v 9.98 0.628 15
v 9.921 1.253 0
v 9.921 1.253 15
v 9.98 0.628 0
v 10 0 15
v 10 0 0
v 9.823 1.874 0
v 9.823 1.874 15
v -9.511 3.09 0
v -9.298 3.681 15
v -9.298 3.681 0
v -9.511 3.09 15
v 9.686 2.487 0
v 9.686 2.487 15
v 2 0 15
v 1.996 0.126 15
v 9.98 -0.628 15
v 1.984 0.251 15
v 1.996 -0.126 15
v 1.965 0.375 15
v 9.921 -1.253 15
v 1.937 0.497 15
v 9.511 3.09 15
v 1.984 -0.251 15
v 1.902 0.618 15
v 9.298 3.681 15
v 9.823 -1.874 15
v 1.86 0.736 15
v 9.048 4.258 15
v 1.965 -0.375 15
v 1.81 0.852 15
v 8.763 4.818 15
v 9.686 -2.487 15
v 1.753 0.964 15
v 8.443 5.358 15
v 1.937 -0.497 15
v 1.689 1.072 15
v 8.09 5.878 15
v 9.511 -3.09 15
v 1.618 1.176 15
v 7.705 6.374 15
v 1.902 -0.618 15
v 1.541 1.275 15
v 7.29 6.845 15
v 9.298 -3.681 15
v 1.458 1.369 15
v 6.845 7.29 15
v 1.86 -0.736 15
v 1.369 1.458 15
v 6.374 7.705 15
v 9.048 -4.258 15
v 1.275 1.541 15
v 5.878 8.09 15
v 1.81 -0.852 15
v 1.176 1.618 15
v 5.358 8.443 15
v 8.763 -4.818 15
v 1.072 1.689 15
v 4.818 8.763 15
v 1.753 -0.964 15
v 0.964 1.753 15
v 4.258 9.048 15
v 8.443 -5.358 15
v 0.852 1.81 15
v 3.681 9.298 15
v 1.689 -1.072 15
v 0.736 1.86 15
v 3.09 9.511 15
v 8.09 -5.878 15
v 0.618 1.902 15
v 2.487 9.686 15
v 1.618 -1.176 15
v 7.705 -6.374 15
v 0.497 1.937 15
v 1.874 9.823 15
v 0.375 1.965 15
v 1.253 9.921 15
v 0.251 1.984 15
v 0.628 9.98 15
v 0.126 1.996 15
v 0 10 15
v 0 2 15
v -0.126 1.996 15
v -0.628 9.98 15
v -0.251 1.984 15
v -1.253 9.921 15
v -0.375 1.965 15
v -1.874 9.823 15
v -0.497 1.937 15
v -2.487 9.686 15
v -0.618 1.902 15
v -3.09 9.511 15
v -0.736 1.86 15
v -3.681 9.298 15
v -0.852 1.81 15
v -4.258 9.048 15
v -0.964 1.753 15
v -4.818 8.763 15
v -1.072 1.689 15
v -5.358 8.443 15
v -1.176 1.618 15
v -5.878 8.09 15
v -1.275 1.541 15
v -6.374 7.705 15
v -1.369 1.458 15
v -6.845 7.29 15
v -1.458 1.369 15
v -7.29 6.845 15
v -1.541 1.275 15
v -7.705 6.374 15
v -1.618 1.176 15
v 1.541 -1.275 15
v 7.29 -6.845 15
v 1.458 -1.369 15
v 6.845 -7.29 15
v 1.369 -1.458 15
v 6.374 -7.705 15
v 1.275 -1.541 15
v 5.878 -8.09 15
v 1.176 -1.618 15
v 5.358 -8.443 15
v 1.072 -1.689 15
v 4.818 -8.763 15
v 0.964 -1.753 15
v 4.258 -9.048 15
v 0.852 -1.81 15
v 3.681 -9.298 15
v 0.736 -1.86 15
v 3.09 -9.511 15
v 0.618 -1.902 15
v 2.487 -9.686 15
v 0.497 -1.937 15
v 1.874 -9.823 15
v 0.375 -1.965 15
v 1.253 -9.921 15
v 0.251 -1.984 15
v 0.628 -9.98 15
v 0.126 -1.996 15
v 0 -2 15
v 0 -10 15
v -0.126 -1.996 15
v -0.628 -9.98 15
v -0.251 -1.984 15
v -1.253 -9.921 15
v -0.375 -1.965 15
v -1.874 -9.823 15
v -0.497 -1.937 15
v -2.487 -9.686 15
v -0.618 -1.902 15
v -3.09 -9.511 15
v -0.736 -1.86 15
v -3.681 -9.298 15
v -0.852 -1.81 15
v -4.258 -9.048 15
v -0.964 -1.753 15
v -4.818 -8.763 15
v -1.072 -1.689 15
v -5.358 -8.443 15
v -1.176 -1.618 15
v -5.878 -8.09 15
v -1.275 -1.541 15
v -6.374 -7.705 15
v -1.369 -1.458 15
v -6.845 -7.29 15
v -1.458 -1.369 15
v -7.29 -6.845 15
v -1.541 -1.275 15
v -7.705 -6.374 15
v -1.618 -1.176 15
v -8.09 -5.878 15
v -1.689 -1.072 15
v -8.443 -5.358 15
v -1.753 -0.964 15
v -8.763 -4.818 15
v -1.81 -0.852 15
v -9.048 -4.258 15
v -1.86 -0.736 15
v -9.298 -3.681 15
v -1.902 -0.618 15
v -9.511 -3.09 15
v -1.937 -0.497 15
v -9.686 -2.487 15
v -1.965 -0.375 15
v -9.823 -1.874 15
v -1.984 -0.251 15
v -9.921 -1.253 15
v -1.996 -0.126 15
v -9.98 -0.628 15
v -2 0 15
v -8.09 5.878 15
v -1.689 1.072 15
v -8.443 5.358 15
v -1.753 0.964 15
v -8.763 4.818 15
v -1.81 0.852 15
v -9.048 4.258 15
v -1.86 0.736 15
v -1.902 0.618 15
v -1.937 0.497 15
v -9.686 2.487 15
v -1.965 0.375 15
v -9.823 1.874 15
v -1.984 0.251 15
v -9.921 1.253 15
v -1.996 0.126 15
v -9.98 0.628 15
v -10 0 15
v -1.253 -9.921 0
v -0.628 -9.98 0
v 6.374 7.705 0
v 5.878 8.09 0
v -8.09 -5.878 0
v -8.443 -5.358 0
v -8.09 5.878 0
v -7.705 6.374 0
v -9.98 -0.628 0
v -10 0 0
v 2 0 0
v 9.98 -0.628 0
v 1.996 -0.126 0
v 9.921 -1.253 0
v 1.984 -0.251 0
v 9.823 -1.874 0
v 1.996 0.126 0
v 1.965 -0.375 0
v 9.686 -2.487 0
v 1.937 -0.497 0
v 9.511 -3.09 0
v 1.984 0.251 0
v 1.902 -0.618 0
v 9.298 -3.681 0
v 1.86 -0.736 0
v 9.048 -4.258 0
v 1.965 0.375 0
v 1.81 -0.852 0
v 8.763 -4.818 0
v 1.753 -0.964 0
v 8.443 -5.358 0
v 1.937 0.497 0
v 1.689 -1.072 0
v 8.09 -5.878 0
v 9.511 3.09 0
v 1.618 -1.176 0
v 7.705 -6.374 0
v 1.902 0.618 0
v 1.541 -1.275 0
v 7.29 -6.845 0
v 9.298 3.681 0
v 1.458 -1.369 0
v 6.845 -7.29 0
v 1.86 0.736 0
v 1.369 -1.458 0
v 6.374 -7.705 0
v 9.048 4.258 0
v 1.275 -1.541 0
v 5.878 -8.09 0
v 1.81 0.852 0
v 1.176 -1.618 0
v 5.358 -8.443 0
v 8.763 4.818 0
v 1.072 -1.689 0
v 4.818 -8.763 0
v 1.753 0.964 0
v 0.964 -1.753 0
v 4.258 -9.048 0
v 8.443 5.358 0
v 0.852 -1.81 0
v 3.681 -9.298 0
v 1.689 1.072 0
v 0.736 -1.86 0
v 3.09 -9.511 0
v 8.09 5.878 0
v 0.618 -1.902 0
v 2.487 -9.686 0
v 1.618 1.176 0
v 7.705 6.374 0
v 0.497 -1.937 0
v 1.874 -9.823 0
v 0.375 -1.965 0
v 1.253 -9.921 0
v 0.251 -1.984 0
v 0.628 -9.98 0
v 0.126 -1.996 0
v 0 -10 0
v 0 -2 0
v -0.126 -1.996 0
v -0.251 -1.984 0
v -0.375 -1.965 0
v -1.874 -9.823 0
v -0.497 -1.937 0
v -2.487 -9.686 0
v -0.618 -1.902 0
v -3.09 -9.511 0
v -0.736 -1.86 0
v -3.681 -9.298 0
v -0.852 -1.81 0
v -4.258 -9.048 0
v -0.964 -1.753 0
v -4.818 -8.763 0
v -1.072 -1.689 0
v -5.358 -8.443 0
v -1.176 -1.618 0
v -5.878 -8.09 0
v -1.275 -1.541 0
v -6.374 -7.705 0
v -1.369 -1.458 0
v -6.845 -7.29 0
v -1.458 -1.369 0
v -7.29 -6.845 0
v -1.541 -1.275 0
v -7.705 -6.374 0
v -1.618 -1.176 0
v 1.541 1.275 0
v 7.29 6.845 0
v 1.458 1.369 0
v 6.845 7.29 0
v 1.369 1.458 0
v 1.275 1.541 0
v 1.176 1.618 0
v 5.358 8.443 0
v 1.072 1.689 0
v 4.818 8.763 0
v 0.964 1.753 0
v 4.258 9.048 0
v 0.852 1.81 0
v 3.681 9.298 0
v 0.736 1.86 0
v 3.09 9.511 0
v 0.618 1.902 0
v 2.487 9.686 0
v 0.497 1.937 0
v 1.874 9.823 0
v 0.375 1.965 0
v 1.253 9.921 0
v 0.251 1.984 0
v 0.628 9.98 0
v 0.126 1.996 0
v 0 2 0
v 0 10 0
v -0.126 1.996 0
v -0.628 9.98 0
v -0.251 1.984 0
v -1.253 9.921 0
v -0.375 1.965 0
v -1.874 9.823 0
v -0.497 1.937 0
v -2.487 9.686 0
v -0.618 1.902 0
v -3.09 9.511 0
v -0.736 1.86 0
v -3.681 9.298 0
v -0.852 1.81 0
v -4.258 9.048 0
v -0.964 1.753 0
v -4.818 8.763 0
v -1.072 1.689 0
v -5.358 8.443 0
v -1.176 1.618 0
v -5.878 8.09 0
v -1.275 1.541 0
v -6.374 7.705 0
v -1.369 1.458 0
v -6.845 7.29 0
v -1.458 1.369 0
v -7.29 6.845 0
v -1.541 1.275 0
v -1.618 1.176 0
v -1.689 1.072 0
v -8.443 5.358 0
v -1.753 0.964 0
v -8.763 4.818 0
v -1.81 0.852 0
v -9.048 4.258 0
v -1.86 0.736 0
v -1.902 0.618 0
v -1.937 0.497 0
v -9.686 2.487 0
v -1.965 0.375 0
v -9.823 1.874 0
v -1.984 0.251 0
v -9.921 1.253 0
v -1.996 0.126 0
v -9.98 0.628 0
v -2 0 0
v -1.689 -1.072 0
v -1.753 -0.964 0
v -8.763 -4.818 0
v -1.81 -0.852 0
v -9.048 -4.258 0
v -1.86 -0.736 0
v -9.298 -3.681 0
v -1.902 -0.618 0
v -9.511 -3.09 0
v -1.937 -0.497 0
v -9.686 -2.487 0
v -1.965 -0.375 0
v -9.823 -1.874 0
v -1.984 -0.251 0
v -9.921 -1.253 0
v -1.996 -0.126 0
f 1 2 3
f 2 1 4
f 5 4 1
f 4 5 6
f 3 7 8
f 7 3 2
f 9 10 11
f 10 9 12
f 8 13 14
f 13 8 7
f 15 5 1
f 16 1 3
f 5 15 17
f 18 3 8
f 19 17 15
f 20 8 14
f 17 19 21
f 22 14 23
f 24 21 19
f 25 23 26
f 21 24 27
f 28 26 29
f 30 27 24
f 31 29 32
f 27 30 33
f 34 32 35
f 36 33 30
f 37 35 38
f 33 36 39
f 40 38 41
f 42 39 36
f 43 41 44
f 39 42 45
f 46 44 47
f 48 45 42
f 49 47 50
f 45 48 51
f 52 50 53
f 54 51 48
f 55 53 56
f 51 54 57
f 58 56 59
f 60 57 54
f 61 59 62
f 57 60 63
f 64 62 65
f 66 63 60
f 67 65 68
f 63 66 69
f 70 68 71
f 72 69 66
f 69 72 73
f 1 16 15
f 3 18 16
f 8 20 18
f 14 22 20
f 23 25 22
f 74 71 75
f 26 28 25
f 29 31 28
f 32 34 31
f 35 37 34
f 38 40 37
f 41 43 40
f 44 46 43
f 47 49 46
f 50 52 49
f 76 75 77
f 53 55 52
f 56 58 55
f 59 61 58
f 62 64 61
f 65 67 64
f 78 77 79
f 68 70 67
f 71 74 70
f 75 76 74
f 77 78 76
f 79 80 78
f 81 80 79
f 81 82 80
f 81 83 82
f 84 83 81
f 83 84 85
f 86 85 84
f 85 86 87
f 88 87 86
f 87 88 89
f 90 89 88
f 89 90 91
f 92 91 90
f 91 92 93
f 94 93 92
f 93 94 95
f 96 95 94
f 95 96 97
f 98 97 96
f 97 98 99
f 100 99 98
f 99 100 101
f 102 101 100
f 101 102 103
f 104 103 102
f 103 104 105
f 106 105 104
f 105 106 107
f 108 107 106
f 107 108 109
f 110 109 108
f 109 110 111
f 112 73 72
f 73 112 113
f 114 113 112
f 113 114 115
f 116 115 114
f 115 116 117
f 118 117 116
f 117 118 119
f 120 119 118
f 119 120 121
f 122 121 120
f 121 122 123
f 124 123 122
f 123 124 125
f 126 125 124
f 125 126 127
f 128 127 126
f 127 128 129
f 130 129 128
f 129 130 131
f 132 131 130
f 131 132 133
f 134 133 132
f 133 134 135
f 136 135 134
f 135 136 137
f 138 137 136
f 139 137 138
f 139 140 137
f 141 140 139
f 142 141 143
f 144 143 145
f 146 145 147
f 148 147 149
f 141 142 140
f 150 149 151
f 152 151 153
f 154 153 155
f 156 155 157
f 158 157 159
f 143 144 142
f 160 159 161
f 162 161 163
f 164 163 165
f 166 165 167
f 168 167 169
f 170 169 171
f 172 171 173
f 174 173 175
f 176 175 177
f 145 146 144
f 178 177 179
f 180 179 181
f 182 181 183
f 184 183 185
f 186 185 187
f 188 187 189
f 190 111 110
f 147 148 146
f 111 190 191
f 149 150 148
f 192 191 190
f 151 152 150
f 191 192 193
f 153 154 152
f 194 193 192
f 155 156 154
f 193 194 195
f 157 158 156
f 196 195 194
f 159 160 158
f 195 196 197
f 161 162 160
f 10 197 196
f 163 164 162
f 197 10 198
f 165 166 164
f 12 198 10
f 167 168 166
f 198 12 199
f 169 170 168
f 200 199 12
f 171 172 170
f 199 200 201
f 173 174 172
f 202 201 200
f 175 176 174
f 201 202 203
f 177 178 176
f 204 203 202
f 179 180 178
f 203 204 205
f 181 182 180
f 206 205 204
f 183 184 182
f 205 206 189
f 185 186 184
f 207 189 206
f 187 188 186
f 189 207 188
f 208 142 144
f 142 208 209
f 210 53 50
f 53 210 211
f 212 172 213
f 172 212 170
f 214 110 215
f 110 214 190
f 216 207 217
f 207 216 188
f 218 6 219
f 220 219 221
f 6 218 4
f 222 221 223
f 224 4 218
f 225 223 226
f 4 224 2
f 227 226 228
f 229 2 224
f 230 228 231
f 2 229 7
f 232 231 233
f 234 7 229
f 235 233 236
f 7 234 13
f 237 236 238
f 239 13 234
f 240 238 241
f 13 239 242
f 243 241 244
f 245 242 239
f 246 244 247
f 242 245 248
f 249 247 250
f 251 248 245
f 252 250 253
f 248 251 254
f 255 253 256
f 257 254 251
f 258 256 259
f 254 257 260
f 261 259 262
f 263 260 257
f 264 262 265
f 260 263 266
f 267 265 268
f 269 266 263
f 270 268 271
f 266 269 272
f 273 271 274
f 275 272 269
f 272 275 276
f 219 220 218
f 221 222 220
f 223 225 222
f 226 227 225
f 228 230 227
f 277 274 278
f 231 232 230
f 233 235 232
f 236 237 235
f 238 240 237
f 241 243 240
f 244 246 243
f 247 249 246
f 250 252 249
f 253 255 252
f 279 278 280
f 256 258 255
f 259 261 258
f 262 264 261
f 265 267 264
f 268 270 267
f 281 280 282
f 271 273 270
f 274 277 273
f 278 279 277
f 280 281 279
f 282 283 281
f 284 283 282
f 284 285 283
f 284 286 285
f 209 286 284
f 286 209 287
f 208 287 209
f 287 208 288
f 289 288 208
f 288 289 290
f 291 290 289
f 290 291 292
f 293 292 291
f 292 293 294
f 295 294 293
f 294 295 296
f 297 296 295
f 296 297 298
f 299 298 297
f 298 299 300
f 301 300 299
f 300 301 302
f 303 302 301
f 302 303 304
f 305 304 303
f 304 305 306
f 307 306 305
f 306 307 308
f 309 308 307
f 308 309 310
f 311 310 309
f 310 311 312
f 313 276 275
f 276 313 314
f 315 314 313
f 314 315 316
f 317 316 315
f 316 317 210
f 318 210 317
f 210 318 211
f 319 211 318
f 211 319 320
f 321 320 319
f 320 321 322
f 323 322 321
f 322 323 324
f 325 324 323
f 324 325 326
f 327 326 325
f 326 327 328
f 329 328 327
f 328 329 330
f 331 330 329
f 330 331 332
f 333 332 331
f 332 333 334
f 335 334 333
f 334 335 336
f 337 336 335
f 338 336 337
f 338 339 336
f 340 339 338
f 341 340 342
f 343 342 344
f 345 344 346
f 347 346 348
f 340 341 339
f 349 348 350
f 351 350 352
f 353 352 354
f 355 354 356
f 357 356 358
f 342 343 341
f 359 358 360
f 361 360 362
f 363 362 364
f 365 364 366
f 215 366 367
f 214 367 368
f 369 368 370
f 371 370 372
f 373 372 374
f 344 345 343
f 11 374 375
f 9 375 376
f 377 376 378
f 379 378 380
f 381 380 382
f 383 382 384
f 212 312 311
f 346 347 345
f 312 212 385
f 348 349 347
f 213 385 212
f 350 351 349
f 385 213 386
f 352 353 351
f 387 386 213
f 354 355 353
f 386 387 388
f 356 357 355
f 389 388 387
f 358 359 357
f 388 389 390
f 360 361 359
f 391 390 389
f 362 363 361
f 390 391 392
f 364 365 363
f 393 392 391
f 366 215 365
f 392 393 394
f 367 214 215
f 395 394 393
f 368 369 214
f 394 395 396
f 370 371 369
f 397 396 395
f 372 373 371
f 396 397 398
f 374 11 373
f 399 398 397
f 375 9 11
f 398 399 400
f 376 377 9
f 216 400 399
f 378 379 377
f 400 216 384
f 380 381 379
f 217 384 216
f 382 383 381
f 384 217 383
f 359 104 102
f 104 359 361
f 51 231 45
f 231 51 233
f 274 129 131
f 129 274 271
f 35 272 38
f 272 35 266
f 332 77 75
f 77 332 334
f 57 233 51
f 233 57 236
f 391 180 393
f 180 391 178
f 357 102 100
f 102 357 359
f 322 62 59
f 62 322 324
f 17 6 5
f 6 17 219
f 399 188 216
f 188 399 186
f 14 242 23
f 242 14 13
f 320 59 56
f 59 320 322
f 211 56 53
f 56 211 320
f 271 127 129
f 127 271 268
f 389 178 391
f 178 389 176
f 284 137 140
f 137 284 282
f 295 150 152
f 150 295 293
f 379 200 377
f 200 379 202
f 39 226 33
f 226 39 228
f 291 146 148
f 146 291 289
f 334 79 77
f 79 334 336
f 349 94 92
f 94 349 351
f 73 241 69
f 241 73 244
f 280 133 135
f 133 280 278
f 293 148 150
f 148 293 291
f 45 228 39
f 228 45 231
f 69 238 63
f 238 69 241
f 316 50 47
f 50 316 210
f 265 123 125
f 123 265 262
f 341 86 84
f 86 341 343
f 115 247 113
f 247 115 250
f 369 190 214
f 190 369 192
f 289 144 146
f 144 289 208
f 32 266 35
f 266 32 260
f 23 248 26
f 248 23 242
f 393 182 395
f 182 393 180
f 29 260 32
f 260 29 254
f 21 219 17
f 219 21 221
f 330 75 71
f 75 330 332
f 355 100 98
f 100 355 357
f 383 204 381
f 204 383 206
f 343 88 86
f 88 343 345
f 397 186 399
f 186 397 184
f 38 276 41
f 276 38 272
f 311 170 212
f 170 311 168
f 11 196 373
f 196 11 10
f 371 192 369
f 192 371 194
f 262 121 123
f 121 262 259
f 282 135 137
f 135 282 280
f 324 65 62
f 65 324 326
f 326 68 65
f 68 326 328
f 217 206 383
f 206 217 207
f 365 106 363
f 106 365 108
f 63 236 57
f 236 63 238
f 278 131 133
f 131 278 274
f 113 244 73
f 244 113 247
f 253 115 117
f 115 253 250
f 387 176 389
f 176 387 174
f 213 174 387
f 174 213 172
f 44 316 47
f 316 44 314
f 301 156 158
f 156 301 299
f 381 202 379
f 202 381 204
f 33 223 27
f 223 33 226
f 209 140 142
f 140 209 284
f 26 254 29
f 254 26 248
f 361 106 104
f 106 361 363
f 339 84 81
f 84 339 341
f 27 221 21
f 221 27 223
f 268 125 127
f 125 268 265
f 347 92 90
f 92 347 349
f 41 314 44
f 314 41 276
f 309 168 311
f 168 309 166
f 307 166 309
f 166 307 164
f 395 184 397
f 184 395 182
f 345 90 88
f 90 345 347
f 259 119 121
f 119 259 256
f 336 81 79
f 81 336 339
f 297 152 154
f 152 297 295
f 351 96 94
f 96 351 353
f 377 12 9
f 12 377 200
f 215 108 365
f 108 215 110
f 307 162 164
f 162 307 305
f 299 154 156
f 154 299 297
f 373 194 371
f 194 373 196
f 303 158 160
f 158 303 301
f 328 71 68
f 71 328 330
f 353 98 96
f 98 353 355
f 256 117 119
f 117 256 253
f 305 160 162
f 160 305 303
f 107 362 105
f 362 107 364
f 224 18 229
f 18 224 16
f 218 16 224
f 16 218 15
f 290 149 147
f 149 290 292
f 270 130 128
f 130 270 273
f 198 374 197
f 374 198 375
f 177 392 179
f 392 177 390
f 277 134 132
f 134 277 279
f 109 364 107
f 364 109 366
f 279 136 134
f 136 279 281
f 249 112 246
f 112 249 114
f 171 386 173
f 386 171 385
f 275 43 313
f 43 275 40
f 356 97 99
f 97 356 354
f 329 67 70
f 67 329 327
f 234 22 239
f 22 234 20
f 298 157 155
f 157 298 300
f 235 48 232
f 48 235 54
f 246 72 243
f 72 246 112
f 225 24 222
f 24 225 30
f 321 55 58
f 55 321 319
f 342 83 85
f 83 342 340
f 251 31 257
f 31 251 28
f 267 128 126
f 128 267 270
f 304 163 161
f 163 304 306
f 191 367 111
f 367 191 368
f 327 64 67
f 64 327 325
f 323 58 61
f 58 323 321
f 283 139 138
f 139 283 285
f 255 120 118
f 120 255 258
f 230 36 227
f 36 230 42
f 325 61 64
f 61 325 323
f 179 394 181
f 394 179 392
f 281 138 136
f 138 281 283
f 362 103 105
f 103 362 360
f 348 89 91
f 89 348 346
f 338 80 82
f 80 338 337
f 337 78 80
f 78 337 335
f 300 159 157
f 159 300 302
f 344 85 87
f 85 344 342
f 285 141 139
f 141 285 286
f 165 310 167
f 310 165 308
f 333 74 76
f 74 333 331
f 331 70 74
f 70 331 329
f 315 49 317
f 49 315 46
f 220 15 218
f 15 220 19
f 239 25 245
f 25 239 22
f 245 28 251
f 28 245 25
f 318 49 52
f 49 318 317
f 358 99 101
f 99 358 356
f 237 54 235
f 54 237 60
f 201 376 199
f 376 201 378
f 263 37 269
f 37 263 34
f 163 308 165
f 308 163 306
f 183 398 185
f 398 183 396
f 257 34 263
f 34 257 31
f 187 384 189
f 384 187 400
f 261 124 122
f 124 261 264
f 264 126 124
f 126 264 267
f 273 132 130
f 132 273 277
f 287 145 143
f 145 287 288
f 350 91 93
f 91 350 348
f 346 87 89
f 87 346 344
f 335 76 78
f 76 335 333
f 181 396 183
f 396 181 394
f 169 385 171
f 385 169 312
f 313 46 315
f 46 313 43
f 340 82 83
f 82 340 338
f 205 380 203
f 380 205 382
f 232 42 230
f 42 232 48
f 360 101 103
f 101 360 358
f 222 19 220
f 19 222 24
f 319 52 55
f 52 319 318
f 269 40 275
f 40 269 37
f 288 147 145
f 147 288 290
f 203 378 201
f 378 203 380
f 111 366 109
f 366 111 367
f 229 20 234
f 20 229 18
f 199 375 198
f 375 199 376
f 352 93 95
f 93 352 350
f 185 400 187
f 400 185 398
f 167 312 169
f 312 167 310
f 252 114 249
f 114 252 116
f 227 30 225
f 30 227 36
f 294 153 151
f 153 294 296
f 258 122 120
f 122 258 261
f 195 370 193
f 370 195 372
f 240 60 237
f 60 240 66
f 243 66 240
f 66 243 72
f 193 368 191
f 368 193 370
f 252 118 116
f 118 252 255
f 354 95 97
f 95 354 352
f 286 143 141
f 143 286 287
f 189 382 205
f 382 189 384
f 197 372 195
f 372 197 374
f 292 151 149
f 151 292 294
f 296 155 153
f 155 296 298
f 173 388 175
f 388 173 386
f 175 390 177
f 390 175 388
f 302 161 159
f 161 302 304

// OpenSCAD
$fn = 100;

module spacer(depth = 15, inner_dia = 4, outer_dia = 20) {
    difference() {
        cylinder(h = depth, r = outer_dia / 2, $fn = $fn);
        cylinder(h = depth, r = inner_dia / 2, $fn = $fn);
    }
}

spacer();
